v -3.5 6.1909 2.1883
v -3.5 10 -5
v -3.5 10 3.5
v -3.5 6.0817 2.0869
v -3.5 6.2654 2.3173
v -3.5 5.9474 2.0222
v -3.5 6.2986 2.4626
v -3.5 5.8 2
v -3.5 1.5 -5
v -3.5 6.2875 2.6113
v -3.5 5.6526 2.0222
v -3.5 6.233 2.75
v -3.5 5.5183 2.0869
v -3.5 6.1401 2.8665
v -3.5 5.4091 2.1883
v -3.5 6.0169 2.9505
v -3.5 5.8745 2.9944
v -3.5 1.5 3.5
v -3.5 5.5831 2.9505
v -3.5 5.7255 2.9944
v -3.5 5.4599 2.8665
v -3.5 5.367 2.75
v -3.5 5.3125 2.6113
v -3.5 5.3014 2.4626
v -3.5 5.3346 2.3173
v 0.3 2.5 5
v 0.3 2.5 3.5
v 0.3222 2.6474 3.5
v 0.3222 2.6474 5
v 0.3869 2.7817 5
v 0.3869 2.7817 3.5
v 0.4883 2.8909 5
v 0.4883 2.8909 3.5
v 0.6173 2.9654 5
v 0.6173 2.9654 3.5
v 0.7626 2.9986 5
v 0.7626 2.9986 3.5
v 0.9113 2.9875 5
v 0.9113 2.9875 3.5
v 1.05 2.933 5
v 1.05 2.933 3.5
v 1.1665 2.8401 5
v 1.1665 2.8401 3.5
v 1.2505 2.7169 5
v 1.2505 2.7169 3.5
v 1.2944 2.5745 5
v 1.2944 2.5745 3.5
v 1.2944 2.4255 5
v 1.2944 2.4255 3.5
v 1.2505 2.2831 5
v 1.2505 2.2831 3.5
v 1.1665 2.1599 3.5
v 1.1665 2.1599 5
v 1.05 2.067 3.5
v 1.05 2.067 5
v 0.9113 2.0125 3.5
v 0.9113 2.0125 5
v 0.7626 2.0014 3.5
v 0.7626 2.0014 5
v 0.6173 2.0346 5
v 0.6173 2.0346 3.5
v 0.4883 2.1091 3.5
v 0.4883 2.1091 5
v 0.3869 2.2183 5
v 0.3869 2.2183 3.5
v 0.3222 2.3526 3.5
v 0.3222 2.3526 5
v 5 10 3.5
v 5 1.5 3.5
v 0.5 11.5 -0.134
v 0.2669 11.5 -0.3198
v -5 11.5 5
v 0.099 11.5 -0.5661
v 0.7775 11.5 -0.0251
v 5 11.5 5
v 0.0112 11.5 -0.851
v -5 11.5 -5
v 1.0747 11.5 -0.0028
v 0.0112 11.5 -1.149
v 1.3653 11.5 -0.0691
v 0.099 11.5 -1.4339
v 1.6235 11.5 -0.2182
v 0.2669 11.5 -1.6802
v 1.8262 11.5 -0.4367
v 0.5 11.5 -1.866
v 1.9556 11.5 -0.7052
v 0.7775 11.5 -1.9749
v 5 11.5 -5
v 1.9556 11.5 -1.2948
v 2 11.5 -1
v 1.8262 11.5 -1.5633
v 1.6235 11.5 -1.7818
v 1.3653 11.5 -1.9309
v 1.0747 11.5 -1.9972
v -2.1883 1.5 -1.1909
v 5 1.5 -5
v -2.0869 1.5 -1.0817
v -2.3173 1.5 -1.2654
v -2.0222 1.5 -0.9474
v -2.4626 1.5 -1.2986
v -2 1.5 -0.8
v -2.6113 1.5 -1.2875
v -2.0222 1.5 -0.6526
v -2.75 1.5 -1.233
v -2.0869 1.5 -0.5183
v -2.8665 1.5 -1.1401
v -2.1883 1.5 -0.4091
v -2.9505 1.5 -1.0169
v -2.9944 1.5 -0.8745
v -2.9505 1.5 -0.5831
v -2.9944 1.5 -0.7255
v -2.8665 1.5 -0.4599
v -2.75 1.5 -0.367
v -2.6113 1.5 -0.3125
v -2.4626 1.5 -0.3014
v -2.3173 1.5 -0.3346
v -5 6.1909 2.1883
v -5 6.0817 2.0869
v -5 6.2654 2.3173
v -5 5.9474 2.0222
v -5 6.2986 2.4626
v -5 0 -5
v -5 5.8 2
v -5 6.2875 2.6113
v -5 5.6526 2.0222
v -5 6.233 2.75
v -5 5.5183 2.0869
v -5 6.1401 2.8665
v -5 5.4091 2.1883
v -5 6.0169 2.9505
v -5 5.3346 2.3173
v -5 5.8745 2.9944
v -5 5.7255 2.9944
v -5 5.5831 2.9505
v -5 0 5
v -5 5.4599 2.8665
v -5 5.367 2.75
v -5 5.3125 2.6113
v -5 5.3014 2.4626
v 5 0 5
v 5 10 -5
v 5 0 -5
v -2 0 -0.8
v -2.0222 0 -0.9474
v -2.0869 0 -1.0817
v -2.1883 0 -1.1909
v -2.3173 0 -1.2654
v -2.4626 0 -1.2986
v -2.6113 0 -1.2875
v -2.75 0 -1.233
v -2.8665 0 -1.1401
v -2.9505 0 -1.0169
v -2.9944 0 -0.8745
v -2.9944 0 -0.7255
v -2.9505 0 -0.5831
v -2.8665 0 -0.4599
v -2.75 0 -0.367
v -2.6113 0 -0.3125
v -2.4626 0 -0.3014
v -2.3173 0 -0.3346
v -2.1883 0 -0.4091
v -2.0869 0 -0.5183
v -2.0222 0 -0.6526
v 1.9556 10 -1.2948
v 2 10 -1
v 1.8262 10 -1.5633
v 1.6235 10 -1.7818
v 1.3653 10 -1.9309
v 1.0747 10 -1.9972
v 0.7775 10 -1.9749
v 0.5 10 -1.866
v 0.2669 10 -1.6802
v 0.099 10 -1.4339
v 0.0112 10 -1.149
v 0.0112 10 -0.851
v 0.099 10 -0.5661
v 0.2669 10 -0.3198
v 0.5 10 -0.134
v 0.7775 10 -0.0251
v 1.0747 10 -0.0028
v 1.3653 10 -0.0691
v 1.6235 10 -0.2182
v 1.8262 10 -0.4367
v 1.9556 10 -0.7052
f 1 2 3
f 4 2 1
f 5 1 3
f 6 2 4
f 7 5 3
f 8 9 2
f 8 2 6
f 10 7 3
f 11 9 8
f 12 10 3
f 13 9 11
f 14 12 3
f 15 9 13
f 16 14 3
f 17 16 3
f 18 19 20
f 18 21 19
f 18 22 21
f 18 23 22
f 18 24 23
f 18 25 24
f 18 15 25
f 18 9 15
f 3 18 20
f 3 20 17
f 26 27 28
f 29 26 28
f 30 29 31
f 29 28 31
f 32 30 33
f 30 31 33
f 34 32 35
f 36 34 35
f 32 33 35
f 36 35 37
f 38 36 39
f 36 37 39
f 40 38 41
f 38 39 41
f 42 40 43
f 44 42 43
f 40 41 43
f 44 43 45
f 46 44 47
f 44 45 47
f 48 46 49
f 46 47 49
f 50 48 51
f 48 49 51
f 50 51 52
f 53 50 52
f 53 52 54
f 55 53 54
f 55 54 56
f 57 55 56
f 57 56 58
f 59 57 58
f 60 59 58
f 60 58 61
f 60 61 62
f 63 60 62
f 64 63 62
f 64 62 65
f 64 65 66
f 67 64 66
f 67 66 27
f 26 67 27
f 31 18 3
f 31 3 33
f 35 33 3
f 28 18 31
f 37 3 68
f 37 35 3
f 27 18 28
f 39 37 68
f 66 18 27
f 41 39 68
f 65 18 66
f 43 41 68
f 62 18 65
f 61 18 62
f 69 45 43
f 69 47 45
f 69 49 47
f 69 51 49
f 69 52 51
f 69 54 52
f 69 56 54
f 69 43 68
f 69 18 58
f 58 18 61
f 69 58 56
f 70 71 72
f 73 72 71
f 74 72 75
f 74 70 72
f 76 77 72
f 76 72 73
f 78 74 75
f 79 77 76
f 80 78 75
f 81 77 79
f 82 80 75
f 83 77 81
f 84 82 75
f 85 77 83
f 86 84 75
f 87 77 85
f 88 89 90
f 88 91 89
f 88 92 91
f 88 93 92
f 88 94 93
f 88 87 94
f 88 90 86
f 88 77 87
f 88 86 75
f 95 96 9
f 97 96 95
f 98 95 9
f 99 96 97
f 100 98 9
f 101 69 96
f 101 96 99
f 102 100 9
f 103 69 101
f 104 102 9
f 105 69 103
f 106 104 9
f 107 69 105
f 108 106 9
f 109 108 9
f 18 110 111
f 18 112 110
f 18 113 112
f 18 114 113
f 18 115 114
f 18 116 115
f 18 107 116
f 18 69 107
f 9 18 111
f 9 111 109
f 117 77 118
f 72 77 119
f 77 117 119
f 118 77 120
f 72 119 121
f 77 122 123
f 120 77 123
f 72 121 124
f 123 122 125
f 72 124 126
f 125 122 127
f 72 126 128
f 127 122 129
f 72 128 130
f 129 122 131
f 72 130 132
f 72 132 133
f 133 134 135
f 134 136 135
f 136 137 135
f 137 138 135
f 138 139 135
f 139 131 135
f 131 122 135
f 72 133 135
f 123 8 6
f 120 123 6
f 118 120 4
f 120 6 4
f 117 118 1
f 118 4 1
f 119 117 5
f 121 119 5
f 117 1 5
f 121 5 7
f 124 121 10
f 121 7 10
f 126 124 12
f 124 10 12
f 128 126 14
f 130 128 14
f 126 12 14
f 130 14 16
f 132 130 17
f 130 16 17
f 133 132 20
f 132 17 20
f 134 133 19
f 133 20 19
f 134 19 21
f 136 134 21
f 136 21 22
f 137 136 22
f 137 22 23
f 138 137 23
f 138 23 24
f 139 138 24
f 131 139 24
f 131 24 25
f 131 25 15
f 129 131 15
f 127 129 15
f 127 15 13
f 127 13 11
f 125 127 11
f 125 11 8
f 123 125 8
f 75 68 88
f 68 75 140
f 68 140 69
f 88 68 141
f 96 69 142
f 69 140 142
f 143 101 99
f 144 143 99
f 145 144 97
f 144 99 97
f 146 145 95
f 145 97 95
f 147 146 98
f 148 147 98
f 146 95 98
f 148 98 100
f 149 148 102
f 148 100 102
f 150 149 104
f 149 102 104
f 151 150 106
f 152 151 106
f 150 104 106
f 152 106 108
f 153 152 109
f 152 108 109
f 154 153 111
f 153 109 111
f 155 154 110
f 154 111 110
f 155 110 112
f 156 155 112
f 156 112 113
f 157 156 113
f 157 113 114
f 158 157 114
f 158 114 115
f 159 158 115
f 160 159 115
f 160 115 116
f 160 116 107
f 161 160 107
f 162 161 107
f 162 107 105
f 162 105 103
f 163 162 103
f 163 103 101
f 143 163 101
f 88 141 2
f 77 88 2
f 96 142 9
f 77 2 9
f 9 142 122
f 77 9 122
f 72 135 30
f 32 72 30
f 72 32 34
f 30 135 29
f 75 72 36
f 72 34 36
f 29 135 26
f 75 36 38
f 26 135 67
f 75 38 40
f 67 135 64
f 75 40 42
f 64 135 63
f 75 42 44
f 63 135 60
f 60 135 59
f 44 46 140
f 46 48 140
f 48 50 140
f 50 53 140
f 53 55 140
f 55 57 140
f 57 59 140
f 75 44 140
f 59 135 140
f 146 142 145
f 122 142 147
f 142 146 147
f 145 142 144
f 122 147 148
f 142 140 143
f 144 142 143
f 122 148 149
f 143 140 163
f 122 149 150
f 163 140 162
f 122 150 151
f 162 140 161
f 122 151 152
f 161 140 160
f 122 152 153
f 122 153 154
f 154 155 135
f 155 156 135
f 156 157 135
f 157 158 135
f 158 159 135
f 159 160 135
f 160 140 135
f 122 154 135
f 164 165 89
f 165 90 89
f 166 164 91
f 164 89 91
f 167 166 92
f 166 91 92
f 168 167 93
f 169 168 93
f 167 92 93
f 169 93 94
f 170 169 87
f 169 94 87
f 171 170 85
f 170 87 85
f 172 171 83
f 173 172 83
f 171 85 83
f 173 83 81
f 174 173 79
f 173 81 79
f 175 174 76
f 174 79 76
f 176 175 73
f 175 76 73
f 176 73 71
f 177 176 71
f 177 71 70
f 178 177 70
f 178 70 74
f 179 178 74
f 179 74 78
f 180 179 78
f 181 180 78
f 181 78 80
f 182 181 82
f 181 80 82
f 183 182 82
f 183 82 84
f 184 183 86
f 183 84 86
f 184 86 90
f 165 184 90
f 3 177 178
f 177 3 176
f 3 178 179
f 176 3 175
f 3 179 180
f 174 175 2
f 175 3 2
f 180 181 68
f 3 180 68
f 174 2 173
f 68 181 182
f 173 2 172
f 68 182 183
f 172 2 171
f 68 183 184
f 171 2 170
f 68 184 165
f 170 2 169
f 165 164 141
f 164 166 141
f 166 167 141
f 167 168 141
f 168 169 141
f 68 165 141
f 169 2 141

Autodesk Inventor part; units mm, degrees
ref_plane "YZ Plane" through (0, 0, 0) normal (1, 0, 0) x (0, 1, 0)
ref_plane "XZ Plane" through (0, 0, 0) normal (0, 1, 0) x (-1, 0, 0)
ref_plane "XY Plane" through (0, 0, 0) normal (0, 0, 1) x (1, 0, 0)
sketch "Sketch1" plane through (0, 0, 0) normal (0, 1, 0) x (-1, 0, 0)
  line L0 (-5, 5) -> (5, 5)
  line L1 (5, 5) -> (5, -5)
  line L2 (5, -5) -> (-5, -5)
  line L3 (-5, -5) -> (-5, 5)
  line L4 (-5, 5) -> (5, -5) construction
  line L5 (5, 5) -> (-5, -5) construction
  point P0 (0, 0)
  dimension "d0" = 10
  dimension "d1" = 10
extrude "Extrusion1" add sketch "Sketch1" along normal blind 1.5
sketch "Sketch3" plane through (0, 1.5, 0) normal (0, 1, 0) x (1, 0, 0)
  line L0 (-5, -5) -> (-5, 5)
  line L1 (-5, 5) -> (-3.5, 5)
  line L2 (5, 5) -> (-5, 5) projected
  line L3 (-3.5, 5) -> (-3.5, -3.5)
  line L4 (-3.5, -3.5) -> (5, -3.5)
  line L5 (5, -3.5) -> (5, -5)
  line L6 (5, -5) -> (-5, -5)
  point P0 (0, 0)
  dimension "d7" = 1.5
  dimension "d8" = 8.5
  dimension "d9" = 90
extrude "Extrusion2" add sketch "Sketch3" along normal blind 8.5
sketch "Sketch5" plane through (0, 1.5, 0) normal (0, 1, 0) x (1, 0, 0)
  circle A0 centre (-2.5, 0.8) radius 0.5
  line L0 (-3.5, 5) -> (-3.5, -3.5) projected
  line L1 (-3.5, -3.5) -> (5, -3.5) projected
  point P0 (0, 0)
  dimension "d14" = 1
  dimension "d15" = 1
  dimension "d16" = 4.3
extrude "Extrusion4" cut sketch "Sketch5" against normal blind 8.5
sketch "Sketch6" plane through (-3.5, 1.5, 3.5) normal (1, 0, 0) x (0, 0, -1)
  circle A0 centre (1, 4.3) radius 0.5
  line L0 (8.5, 0) -> (0, 0) projected
  line L1 (0, 0) -> (0, 8.5) projected
  point P0 (3.5, -1.5)
  point P1 (0, 7)
  dimension "d19" = 1
  dimension "d20" = 4.3
  dimension "d21" = 1
extrude "Extrusion5" cut sketch "Sketch6" against normal blind 8.5
sketch "Sketch7" plane through (5, 1.5, 3.5) normal (0, 0, -1) x (-1, 0, 0)
  circle A0 centre (4.2, 1) radius 0.5
  line L0 (8.5, 0) -> (0, 0) projected
  line L1 (8.5, 0) -> (8.5, 8.5) projected
  point P0 (5, -1.5)
  dimension "d24" = 1
  dimension "d25" = 1
  dimension "d26" = 4.3
extrude "Extrusion6" cut sketch "Sketch7" against normal blind 8.5
sketch "Sketch8" plane through (0, 10, 0) normal (0, 1, 0) x (1, 0, 0)
  line L0 (5, -5) -> (5, 5)
  line L1 (5, 5) -> (-5, 5)
  line L2 (-5, 5) -> (-5, -5)
  line L3 (-5, -5) -> (5, -5)
  point P0 (0, 0)
extrude "Extrusion7" add sketch "Sketch8" along normal blind 1.5
sketch "Sketch9" plane through (0, 11.5, 0) normal (0, 1, 0) x (1, 0, 0)
  circle A0 centre (1, 1) radius 1
  line L0 (-5, 5) -> (-5, -5) projected
  line L1 (-5, -5) -> (5, -5) projected
  point P0 (0, 0)
  dimension "d31" = 2
  dimension "d32" = 6
  dimension "d33" = 6
extrude "Extrusion8" cut sketch "Sketch9" against normal blind 1.5
properties part number "Corner"
